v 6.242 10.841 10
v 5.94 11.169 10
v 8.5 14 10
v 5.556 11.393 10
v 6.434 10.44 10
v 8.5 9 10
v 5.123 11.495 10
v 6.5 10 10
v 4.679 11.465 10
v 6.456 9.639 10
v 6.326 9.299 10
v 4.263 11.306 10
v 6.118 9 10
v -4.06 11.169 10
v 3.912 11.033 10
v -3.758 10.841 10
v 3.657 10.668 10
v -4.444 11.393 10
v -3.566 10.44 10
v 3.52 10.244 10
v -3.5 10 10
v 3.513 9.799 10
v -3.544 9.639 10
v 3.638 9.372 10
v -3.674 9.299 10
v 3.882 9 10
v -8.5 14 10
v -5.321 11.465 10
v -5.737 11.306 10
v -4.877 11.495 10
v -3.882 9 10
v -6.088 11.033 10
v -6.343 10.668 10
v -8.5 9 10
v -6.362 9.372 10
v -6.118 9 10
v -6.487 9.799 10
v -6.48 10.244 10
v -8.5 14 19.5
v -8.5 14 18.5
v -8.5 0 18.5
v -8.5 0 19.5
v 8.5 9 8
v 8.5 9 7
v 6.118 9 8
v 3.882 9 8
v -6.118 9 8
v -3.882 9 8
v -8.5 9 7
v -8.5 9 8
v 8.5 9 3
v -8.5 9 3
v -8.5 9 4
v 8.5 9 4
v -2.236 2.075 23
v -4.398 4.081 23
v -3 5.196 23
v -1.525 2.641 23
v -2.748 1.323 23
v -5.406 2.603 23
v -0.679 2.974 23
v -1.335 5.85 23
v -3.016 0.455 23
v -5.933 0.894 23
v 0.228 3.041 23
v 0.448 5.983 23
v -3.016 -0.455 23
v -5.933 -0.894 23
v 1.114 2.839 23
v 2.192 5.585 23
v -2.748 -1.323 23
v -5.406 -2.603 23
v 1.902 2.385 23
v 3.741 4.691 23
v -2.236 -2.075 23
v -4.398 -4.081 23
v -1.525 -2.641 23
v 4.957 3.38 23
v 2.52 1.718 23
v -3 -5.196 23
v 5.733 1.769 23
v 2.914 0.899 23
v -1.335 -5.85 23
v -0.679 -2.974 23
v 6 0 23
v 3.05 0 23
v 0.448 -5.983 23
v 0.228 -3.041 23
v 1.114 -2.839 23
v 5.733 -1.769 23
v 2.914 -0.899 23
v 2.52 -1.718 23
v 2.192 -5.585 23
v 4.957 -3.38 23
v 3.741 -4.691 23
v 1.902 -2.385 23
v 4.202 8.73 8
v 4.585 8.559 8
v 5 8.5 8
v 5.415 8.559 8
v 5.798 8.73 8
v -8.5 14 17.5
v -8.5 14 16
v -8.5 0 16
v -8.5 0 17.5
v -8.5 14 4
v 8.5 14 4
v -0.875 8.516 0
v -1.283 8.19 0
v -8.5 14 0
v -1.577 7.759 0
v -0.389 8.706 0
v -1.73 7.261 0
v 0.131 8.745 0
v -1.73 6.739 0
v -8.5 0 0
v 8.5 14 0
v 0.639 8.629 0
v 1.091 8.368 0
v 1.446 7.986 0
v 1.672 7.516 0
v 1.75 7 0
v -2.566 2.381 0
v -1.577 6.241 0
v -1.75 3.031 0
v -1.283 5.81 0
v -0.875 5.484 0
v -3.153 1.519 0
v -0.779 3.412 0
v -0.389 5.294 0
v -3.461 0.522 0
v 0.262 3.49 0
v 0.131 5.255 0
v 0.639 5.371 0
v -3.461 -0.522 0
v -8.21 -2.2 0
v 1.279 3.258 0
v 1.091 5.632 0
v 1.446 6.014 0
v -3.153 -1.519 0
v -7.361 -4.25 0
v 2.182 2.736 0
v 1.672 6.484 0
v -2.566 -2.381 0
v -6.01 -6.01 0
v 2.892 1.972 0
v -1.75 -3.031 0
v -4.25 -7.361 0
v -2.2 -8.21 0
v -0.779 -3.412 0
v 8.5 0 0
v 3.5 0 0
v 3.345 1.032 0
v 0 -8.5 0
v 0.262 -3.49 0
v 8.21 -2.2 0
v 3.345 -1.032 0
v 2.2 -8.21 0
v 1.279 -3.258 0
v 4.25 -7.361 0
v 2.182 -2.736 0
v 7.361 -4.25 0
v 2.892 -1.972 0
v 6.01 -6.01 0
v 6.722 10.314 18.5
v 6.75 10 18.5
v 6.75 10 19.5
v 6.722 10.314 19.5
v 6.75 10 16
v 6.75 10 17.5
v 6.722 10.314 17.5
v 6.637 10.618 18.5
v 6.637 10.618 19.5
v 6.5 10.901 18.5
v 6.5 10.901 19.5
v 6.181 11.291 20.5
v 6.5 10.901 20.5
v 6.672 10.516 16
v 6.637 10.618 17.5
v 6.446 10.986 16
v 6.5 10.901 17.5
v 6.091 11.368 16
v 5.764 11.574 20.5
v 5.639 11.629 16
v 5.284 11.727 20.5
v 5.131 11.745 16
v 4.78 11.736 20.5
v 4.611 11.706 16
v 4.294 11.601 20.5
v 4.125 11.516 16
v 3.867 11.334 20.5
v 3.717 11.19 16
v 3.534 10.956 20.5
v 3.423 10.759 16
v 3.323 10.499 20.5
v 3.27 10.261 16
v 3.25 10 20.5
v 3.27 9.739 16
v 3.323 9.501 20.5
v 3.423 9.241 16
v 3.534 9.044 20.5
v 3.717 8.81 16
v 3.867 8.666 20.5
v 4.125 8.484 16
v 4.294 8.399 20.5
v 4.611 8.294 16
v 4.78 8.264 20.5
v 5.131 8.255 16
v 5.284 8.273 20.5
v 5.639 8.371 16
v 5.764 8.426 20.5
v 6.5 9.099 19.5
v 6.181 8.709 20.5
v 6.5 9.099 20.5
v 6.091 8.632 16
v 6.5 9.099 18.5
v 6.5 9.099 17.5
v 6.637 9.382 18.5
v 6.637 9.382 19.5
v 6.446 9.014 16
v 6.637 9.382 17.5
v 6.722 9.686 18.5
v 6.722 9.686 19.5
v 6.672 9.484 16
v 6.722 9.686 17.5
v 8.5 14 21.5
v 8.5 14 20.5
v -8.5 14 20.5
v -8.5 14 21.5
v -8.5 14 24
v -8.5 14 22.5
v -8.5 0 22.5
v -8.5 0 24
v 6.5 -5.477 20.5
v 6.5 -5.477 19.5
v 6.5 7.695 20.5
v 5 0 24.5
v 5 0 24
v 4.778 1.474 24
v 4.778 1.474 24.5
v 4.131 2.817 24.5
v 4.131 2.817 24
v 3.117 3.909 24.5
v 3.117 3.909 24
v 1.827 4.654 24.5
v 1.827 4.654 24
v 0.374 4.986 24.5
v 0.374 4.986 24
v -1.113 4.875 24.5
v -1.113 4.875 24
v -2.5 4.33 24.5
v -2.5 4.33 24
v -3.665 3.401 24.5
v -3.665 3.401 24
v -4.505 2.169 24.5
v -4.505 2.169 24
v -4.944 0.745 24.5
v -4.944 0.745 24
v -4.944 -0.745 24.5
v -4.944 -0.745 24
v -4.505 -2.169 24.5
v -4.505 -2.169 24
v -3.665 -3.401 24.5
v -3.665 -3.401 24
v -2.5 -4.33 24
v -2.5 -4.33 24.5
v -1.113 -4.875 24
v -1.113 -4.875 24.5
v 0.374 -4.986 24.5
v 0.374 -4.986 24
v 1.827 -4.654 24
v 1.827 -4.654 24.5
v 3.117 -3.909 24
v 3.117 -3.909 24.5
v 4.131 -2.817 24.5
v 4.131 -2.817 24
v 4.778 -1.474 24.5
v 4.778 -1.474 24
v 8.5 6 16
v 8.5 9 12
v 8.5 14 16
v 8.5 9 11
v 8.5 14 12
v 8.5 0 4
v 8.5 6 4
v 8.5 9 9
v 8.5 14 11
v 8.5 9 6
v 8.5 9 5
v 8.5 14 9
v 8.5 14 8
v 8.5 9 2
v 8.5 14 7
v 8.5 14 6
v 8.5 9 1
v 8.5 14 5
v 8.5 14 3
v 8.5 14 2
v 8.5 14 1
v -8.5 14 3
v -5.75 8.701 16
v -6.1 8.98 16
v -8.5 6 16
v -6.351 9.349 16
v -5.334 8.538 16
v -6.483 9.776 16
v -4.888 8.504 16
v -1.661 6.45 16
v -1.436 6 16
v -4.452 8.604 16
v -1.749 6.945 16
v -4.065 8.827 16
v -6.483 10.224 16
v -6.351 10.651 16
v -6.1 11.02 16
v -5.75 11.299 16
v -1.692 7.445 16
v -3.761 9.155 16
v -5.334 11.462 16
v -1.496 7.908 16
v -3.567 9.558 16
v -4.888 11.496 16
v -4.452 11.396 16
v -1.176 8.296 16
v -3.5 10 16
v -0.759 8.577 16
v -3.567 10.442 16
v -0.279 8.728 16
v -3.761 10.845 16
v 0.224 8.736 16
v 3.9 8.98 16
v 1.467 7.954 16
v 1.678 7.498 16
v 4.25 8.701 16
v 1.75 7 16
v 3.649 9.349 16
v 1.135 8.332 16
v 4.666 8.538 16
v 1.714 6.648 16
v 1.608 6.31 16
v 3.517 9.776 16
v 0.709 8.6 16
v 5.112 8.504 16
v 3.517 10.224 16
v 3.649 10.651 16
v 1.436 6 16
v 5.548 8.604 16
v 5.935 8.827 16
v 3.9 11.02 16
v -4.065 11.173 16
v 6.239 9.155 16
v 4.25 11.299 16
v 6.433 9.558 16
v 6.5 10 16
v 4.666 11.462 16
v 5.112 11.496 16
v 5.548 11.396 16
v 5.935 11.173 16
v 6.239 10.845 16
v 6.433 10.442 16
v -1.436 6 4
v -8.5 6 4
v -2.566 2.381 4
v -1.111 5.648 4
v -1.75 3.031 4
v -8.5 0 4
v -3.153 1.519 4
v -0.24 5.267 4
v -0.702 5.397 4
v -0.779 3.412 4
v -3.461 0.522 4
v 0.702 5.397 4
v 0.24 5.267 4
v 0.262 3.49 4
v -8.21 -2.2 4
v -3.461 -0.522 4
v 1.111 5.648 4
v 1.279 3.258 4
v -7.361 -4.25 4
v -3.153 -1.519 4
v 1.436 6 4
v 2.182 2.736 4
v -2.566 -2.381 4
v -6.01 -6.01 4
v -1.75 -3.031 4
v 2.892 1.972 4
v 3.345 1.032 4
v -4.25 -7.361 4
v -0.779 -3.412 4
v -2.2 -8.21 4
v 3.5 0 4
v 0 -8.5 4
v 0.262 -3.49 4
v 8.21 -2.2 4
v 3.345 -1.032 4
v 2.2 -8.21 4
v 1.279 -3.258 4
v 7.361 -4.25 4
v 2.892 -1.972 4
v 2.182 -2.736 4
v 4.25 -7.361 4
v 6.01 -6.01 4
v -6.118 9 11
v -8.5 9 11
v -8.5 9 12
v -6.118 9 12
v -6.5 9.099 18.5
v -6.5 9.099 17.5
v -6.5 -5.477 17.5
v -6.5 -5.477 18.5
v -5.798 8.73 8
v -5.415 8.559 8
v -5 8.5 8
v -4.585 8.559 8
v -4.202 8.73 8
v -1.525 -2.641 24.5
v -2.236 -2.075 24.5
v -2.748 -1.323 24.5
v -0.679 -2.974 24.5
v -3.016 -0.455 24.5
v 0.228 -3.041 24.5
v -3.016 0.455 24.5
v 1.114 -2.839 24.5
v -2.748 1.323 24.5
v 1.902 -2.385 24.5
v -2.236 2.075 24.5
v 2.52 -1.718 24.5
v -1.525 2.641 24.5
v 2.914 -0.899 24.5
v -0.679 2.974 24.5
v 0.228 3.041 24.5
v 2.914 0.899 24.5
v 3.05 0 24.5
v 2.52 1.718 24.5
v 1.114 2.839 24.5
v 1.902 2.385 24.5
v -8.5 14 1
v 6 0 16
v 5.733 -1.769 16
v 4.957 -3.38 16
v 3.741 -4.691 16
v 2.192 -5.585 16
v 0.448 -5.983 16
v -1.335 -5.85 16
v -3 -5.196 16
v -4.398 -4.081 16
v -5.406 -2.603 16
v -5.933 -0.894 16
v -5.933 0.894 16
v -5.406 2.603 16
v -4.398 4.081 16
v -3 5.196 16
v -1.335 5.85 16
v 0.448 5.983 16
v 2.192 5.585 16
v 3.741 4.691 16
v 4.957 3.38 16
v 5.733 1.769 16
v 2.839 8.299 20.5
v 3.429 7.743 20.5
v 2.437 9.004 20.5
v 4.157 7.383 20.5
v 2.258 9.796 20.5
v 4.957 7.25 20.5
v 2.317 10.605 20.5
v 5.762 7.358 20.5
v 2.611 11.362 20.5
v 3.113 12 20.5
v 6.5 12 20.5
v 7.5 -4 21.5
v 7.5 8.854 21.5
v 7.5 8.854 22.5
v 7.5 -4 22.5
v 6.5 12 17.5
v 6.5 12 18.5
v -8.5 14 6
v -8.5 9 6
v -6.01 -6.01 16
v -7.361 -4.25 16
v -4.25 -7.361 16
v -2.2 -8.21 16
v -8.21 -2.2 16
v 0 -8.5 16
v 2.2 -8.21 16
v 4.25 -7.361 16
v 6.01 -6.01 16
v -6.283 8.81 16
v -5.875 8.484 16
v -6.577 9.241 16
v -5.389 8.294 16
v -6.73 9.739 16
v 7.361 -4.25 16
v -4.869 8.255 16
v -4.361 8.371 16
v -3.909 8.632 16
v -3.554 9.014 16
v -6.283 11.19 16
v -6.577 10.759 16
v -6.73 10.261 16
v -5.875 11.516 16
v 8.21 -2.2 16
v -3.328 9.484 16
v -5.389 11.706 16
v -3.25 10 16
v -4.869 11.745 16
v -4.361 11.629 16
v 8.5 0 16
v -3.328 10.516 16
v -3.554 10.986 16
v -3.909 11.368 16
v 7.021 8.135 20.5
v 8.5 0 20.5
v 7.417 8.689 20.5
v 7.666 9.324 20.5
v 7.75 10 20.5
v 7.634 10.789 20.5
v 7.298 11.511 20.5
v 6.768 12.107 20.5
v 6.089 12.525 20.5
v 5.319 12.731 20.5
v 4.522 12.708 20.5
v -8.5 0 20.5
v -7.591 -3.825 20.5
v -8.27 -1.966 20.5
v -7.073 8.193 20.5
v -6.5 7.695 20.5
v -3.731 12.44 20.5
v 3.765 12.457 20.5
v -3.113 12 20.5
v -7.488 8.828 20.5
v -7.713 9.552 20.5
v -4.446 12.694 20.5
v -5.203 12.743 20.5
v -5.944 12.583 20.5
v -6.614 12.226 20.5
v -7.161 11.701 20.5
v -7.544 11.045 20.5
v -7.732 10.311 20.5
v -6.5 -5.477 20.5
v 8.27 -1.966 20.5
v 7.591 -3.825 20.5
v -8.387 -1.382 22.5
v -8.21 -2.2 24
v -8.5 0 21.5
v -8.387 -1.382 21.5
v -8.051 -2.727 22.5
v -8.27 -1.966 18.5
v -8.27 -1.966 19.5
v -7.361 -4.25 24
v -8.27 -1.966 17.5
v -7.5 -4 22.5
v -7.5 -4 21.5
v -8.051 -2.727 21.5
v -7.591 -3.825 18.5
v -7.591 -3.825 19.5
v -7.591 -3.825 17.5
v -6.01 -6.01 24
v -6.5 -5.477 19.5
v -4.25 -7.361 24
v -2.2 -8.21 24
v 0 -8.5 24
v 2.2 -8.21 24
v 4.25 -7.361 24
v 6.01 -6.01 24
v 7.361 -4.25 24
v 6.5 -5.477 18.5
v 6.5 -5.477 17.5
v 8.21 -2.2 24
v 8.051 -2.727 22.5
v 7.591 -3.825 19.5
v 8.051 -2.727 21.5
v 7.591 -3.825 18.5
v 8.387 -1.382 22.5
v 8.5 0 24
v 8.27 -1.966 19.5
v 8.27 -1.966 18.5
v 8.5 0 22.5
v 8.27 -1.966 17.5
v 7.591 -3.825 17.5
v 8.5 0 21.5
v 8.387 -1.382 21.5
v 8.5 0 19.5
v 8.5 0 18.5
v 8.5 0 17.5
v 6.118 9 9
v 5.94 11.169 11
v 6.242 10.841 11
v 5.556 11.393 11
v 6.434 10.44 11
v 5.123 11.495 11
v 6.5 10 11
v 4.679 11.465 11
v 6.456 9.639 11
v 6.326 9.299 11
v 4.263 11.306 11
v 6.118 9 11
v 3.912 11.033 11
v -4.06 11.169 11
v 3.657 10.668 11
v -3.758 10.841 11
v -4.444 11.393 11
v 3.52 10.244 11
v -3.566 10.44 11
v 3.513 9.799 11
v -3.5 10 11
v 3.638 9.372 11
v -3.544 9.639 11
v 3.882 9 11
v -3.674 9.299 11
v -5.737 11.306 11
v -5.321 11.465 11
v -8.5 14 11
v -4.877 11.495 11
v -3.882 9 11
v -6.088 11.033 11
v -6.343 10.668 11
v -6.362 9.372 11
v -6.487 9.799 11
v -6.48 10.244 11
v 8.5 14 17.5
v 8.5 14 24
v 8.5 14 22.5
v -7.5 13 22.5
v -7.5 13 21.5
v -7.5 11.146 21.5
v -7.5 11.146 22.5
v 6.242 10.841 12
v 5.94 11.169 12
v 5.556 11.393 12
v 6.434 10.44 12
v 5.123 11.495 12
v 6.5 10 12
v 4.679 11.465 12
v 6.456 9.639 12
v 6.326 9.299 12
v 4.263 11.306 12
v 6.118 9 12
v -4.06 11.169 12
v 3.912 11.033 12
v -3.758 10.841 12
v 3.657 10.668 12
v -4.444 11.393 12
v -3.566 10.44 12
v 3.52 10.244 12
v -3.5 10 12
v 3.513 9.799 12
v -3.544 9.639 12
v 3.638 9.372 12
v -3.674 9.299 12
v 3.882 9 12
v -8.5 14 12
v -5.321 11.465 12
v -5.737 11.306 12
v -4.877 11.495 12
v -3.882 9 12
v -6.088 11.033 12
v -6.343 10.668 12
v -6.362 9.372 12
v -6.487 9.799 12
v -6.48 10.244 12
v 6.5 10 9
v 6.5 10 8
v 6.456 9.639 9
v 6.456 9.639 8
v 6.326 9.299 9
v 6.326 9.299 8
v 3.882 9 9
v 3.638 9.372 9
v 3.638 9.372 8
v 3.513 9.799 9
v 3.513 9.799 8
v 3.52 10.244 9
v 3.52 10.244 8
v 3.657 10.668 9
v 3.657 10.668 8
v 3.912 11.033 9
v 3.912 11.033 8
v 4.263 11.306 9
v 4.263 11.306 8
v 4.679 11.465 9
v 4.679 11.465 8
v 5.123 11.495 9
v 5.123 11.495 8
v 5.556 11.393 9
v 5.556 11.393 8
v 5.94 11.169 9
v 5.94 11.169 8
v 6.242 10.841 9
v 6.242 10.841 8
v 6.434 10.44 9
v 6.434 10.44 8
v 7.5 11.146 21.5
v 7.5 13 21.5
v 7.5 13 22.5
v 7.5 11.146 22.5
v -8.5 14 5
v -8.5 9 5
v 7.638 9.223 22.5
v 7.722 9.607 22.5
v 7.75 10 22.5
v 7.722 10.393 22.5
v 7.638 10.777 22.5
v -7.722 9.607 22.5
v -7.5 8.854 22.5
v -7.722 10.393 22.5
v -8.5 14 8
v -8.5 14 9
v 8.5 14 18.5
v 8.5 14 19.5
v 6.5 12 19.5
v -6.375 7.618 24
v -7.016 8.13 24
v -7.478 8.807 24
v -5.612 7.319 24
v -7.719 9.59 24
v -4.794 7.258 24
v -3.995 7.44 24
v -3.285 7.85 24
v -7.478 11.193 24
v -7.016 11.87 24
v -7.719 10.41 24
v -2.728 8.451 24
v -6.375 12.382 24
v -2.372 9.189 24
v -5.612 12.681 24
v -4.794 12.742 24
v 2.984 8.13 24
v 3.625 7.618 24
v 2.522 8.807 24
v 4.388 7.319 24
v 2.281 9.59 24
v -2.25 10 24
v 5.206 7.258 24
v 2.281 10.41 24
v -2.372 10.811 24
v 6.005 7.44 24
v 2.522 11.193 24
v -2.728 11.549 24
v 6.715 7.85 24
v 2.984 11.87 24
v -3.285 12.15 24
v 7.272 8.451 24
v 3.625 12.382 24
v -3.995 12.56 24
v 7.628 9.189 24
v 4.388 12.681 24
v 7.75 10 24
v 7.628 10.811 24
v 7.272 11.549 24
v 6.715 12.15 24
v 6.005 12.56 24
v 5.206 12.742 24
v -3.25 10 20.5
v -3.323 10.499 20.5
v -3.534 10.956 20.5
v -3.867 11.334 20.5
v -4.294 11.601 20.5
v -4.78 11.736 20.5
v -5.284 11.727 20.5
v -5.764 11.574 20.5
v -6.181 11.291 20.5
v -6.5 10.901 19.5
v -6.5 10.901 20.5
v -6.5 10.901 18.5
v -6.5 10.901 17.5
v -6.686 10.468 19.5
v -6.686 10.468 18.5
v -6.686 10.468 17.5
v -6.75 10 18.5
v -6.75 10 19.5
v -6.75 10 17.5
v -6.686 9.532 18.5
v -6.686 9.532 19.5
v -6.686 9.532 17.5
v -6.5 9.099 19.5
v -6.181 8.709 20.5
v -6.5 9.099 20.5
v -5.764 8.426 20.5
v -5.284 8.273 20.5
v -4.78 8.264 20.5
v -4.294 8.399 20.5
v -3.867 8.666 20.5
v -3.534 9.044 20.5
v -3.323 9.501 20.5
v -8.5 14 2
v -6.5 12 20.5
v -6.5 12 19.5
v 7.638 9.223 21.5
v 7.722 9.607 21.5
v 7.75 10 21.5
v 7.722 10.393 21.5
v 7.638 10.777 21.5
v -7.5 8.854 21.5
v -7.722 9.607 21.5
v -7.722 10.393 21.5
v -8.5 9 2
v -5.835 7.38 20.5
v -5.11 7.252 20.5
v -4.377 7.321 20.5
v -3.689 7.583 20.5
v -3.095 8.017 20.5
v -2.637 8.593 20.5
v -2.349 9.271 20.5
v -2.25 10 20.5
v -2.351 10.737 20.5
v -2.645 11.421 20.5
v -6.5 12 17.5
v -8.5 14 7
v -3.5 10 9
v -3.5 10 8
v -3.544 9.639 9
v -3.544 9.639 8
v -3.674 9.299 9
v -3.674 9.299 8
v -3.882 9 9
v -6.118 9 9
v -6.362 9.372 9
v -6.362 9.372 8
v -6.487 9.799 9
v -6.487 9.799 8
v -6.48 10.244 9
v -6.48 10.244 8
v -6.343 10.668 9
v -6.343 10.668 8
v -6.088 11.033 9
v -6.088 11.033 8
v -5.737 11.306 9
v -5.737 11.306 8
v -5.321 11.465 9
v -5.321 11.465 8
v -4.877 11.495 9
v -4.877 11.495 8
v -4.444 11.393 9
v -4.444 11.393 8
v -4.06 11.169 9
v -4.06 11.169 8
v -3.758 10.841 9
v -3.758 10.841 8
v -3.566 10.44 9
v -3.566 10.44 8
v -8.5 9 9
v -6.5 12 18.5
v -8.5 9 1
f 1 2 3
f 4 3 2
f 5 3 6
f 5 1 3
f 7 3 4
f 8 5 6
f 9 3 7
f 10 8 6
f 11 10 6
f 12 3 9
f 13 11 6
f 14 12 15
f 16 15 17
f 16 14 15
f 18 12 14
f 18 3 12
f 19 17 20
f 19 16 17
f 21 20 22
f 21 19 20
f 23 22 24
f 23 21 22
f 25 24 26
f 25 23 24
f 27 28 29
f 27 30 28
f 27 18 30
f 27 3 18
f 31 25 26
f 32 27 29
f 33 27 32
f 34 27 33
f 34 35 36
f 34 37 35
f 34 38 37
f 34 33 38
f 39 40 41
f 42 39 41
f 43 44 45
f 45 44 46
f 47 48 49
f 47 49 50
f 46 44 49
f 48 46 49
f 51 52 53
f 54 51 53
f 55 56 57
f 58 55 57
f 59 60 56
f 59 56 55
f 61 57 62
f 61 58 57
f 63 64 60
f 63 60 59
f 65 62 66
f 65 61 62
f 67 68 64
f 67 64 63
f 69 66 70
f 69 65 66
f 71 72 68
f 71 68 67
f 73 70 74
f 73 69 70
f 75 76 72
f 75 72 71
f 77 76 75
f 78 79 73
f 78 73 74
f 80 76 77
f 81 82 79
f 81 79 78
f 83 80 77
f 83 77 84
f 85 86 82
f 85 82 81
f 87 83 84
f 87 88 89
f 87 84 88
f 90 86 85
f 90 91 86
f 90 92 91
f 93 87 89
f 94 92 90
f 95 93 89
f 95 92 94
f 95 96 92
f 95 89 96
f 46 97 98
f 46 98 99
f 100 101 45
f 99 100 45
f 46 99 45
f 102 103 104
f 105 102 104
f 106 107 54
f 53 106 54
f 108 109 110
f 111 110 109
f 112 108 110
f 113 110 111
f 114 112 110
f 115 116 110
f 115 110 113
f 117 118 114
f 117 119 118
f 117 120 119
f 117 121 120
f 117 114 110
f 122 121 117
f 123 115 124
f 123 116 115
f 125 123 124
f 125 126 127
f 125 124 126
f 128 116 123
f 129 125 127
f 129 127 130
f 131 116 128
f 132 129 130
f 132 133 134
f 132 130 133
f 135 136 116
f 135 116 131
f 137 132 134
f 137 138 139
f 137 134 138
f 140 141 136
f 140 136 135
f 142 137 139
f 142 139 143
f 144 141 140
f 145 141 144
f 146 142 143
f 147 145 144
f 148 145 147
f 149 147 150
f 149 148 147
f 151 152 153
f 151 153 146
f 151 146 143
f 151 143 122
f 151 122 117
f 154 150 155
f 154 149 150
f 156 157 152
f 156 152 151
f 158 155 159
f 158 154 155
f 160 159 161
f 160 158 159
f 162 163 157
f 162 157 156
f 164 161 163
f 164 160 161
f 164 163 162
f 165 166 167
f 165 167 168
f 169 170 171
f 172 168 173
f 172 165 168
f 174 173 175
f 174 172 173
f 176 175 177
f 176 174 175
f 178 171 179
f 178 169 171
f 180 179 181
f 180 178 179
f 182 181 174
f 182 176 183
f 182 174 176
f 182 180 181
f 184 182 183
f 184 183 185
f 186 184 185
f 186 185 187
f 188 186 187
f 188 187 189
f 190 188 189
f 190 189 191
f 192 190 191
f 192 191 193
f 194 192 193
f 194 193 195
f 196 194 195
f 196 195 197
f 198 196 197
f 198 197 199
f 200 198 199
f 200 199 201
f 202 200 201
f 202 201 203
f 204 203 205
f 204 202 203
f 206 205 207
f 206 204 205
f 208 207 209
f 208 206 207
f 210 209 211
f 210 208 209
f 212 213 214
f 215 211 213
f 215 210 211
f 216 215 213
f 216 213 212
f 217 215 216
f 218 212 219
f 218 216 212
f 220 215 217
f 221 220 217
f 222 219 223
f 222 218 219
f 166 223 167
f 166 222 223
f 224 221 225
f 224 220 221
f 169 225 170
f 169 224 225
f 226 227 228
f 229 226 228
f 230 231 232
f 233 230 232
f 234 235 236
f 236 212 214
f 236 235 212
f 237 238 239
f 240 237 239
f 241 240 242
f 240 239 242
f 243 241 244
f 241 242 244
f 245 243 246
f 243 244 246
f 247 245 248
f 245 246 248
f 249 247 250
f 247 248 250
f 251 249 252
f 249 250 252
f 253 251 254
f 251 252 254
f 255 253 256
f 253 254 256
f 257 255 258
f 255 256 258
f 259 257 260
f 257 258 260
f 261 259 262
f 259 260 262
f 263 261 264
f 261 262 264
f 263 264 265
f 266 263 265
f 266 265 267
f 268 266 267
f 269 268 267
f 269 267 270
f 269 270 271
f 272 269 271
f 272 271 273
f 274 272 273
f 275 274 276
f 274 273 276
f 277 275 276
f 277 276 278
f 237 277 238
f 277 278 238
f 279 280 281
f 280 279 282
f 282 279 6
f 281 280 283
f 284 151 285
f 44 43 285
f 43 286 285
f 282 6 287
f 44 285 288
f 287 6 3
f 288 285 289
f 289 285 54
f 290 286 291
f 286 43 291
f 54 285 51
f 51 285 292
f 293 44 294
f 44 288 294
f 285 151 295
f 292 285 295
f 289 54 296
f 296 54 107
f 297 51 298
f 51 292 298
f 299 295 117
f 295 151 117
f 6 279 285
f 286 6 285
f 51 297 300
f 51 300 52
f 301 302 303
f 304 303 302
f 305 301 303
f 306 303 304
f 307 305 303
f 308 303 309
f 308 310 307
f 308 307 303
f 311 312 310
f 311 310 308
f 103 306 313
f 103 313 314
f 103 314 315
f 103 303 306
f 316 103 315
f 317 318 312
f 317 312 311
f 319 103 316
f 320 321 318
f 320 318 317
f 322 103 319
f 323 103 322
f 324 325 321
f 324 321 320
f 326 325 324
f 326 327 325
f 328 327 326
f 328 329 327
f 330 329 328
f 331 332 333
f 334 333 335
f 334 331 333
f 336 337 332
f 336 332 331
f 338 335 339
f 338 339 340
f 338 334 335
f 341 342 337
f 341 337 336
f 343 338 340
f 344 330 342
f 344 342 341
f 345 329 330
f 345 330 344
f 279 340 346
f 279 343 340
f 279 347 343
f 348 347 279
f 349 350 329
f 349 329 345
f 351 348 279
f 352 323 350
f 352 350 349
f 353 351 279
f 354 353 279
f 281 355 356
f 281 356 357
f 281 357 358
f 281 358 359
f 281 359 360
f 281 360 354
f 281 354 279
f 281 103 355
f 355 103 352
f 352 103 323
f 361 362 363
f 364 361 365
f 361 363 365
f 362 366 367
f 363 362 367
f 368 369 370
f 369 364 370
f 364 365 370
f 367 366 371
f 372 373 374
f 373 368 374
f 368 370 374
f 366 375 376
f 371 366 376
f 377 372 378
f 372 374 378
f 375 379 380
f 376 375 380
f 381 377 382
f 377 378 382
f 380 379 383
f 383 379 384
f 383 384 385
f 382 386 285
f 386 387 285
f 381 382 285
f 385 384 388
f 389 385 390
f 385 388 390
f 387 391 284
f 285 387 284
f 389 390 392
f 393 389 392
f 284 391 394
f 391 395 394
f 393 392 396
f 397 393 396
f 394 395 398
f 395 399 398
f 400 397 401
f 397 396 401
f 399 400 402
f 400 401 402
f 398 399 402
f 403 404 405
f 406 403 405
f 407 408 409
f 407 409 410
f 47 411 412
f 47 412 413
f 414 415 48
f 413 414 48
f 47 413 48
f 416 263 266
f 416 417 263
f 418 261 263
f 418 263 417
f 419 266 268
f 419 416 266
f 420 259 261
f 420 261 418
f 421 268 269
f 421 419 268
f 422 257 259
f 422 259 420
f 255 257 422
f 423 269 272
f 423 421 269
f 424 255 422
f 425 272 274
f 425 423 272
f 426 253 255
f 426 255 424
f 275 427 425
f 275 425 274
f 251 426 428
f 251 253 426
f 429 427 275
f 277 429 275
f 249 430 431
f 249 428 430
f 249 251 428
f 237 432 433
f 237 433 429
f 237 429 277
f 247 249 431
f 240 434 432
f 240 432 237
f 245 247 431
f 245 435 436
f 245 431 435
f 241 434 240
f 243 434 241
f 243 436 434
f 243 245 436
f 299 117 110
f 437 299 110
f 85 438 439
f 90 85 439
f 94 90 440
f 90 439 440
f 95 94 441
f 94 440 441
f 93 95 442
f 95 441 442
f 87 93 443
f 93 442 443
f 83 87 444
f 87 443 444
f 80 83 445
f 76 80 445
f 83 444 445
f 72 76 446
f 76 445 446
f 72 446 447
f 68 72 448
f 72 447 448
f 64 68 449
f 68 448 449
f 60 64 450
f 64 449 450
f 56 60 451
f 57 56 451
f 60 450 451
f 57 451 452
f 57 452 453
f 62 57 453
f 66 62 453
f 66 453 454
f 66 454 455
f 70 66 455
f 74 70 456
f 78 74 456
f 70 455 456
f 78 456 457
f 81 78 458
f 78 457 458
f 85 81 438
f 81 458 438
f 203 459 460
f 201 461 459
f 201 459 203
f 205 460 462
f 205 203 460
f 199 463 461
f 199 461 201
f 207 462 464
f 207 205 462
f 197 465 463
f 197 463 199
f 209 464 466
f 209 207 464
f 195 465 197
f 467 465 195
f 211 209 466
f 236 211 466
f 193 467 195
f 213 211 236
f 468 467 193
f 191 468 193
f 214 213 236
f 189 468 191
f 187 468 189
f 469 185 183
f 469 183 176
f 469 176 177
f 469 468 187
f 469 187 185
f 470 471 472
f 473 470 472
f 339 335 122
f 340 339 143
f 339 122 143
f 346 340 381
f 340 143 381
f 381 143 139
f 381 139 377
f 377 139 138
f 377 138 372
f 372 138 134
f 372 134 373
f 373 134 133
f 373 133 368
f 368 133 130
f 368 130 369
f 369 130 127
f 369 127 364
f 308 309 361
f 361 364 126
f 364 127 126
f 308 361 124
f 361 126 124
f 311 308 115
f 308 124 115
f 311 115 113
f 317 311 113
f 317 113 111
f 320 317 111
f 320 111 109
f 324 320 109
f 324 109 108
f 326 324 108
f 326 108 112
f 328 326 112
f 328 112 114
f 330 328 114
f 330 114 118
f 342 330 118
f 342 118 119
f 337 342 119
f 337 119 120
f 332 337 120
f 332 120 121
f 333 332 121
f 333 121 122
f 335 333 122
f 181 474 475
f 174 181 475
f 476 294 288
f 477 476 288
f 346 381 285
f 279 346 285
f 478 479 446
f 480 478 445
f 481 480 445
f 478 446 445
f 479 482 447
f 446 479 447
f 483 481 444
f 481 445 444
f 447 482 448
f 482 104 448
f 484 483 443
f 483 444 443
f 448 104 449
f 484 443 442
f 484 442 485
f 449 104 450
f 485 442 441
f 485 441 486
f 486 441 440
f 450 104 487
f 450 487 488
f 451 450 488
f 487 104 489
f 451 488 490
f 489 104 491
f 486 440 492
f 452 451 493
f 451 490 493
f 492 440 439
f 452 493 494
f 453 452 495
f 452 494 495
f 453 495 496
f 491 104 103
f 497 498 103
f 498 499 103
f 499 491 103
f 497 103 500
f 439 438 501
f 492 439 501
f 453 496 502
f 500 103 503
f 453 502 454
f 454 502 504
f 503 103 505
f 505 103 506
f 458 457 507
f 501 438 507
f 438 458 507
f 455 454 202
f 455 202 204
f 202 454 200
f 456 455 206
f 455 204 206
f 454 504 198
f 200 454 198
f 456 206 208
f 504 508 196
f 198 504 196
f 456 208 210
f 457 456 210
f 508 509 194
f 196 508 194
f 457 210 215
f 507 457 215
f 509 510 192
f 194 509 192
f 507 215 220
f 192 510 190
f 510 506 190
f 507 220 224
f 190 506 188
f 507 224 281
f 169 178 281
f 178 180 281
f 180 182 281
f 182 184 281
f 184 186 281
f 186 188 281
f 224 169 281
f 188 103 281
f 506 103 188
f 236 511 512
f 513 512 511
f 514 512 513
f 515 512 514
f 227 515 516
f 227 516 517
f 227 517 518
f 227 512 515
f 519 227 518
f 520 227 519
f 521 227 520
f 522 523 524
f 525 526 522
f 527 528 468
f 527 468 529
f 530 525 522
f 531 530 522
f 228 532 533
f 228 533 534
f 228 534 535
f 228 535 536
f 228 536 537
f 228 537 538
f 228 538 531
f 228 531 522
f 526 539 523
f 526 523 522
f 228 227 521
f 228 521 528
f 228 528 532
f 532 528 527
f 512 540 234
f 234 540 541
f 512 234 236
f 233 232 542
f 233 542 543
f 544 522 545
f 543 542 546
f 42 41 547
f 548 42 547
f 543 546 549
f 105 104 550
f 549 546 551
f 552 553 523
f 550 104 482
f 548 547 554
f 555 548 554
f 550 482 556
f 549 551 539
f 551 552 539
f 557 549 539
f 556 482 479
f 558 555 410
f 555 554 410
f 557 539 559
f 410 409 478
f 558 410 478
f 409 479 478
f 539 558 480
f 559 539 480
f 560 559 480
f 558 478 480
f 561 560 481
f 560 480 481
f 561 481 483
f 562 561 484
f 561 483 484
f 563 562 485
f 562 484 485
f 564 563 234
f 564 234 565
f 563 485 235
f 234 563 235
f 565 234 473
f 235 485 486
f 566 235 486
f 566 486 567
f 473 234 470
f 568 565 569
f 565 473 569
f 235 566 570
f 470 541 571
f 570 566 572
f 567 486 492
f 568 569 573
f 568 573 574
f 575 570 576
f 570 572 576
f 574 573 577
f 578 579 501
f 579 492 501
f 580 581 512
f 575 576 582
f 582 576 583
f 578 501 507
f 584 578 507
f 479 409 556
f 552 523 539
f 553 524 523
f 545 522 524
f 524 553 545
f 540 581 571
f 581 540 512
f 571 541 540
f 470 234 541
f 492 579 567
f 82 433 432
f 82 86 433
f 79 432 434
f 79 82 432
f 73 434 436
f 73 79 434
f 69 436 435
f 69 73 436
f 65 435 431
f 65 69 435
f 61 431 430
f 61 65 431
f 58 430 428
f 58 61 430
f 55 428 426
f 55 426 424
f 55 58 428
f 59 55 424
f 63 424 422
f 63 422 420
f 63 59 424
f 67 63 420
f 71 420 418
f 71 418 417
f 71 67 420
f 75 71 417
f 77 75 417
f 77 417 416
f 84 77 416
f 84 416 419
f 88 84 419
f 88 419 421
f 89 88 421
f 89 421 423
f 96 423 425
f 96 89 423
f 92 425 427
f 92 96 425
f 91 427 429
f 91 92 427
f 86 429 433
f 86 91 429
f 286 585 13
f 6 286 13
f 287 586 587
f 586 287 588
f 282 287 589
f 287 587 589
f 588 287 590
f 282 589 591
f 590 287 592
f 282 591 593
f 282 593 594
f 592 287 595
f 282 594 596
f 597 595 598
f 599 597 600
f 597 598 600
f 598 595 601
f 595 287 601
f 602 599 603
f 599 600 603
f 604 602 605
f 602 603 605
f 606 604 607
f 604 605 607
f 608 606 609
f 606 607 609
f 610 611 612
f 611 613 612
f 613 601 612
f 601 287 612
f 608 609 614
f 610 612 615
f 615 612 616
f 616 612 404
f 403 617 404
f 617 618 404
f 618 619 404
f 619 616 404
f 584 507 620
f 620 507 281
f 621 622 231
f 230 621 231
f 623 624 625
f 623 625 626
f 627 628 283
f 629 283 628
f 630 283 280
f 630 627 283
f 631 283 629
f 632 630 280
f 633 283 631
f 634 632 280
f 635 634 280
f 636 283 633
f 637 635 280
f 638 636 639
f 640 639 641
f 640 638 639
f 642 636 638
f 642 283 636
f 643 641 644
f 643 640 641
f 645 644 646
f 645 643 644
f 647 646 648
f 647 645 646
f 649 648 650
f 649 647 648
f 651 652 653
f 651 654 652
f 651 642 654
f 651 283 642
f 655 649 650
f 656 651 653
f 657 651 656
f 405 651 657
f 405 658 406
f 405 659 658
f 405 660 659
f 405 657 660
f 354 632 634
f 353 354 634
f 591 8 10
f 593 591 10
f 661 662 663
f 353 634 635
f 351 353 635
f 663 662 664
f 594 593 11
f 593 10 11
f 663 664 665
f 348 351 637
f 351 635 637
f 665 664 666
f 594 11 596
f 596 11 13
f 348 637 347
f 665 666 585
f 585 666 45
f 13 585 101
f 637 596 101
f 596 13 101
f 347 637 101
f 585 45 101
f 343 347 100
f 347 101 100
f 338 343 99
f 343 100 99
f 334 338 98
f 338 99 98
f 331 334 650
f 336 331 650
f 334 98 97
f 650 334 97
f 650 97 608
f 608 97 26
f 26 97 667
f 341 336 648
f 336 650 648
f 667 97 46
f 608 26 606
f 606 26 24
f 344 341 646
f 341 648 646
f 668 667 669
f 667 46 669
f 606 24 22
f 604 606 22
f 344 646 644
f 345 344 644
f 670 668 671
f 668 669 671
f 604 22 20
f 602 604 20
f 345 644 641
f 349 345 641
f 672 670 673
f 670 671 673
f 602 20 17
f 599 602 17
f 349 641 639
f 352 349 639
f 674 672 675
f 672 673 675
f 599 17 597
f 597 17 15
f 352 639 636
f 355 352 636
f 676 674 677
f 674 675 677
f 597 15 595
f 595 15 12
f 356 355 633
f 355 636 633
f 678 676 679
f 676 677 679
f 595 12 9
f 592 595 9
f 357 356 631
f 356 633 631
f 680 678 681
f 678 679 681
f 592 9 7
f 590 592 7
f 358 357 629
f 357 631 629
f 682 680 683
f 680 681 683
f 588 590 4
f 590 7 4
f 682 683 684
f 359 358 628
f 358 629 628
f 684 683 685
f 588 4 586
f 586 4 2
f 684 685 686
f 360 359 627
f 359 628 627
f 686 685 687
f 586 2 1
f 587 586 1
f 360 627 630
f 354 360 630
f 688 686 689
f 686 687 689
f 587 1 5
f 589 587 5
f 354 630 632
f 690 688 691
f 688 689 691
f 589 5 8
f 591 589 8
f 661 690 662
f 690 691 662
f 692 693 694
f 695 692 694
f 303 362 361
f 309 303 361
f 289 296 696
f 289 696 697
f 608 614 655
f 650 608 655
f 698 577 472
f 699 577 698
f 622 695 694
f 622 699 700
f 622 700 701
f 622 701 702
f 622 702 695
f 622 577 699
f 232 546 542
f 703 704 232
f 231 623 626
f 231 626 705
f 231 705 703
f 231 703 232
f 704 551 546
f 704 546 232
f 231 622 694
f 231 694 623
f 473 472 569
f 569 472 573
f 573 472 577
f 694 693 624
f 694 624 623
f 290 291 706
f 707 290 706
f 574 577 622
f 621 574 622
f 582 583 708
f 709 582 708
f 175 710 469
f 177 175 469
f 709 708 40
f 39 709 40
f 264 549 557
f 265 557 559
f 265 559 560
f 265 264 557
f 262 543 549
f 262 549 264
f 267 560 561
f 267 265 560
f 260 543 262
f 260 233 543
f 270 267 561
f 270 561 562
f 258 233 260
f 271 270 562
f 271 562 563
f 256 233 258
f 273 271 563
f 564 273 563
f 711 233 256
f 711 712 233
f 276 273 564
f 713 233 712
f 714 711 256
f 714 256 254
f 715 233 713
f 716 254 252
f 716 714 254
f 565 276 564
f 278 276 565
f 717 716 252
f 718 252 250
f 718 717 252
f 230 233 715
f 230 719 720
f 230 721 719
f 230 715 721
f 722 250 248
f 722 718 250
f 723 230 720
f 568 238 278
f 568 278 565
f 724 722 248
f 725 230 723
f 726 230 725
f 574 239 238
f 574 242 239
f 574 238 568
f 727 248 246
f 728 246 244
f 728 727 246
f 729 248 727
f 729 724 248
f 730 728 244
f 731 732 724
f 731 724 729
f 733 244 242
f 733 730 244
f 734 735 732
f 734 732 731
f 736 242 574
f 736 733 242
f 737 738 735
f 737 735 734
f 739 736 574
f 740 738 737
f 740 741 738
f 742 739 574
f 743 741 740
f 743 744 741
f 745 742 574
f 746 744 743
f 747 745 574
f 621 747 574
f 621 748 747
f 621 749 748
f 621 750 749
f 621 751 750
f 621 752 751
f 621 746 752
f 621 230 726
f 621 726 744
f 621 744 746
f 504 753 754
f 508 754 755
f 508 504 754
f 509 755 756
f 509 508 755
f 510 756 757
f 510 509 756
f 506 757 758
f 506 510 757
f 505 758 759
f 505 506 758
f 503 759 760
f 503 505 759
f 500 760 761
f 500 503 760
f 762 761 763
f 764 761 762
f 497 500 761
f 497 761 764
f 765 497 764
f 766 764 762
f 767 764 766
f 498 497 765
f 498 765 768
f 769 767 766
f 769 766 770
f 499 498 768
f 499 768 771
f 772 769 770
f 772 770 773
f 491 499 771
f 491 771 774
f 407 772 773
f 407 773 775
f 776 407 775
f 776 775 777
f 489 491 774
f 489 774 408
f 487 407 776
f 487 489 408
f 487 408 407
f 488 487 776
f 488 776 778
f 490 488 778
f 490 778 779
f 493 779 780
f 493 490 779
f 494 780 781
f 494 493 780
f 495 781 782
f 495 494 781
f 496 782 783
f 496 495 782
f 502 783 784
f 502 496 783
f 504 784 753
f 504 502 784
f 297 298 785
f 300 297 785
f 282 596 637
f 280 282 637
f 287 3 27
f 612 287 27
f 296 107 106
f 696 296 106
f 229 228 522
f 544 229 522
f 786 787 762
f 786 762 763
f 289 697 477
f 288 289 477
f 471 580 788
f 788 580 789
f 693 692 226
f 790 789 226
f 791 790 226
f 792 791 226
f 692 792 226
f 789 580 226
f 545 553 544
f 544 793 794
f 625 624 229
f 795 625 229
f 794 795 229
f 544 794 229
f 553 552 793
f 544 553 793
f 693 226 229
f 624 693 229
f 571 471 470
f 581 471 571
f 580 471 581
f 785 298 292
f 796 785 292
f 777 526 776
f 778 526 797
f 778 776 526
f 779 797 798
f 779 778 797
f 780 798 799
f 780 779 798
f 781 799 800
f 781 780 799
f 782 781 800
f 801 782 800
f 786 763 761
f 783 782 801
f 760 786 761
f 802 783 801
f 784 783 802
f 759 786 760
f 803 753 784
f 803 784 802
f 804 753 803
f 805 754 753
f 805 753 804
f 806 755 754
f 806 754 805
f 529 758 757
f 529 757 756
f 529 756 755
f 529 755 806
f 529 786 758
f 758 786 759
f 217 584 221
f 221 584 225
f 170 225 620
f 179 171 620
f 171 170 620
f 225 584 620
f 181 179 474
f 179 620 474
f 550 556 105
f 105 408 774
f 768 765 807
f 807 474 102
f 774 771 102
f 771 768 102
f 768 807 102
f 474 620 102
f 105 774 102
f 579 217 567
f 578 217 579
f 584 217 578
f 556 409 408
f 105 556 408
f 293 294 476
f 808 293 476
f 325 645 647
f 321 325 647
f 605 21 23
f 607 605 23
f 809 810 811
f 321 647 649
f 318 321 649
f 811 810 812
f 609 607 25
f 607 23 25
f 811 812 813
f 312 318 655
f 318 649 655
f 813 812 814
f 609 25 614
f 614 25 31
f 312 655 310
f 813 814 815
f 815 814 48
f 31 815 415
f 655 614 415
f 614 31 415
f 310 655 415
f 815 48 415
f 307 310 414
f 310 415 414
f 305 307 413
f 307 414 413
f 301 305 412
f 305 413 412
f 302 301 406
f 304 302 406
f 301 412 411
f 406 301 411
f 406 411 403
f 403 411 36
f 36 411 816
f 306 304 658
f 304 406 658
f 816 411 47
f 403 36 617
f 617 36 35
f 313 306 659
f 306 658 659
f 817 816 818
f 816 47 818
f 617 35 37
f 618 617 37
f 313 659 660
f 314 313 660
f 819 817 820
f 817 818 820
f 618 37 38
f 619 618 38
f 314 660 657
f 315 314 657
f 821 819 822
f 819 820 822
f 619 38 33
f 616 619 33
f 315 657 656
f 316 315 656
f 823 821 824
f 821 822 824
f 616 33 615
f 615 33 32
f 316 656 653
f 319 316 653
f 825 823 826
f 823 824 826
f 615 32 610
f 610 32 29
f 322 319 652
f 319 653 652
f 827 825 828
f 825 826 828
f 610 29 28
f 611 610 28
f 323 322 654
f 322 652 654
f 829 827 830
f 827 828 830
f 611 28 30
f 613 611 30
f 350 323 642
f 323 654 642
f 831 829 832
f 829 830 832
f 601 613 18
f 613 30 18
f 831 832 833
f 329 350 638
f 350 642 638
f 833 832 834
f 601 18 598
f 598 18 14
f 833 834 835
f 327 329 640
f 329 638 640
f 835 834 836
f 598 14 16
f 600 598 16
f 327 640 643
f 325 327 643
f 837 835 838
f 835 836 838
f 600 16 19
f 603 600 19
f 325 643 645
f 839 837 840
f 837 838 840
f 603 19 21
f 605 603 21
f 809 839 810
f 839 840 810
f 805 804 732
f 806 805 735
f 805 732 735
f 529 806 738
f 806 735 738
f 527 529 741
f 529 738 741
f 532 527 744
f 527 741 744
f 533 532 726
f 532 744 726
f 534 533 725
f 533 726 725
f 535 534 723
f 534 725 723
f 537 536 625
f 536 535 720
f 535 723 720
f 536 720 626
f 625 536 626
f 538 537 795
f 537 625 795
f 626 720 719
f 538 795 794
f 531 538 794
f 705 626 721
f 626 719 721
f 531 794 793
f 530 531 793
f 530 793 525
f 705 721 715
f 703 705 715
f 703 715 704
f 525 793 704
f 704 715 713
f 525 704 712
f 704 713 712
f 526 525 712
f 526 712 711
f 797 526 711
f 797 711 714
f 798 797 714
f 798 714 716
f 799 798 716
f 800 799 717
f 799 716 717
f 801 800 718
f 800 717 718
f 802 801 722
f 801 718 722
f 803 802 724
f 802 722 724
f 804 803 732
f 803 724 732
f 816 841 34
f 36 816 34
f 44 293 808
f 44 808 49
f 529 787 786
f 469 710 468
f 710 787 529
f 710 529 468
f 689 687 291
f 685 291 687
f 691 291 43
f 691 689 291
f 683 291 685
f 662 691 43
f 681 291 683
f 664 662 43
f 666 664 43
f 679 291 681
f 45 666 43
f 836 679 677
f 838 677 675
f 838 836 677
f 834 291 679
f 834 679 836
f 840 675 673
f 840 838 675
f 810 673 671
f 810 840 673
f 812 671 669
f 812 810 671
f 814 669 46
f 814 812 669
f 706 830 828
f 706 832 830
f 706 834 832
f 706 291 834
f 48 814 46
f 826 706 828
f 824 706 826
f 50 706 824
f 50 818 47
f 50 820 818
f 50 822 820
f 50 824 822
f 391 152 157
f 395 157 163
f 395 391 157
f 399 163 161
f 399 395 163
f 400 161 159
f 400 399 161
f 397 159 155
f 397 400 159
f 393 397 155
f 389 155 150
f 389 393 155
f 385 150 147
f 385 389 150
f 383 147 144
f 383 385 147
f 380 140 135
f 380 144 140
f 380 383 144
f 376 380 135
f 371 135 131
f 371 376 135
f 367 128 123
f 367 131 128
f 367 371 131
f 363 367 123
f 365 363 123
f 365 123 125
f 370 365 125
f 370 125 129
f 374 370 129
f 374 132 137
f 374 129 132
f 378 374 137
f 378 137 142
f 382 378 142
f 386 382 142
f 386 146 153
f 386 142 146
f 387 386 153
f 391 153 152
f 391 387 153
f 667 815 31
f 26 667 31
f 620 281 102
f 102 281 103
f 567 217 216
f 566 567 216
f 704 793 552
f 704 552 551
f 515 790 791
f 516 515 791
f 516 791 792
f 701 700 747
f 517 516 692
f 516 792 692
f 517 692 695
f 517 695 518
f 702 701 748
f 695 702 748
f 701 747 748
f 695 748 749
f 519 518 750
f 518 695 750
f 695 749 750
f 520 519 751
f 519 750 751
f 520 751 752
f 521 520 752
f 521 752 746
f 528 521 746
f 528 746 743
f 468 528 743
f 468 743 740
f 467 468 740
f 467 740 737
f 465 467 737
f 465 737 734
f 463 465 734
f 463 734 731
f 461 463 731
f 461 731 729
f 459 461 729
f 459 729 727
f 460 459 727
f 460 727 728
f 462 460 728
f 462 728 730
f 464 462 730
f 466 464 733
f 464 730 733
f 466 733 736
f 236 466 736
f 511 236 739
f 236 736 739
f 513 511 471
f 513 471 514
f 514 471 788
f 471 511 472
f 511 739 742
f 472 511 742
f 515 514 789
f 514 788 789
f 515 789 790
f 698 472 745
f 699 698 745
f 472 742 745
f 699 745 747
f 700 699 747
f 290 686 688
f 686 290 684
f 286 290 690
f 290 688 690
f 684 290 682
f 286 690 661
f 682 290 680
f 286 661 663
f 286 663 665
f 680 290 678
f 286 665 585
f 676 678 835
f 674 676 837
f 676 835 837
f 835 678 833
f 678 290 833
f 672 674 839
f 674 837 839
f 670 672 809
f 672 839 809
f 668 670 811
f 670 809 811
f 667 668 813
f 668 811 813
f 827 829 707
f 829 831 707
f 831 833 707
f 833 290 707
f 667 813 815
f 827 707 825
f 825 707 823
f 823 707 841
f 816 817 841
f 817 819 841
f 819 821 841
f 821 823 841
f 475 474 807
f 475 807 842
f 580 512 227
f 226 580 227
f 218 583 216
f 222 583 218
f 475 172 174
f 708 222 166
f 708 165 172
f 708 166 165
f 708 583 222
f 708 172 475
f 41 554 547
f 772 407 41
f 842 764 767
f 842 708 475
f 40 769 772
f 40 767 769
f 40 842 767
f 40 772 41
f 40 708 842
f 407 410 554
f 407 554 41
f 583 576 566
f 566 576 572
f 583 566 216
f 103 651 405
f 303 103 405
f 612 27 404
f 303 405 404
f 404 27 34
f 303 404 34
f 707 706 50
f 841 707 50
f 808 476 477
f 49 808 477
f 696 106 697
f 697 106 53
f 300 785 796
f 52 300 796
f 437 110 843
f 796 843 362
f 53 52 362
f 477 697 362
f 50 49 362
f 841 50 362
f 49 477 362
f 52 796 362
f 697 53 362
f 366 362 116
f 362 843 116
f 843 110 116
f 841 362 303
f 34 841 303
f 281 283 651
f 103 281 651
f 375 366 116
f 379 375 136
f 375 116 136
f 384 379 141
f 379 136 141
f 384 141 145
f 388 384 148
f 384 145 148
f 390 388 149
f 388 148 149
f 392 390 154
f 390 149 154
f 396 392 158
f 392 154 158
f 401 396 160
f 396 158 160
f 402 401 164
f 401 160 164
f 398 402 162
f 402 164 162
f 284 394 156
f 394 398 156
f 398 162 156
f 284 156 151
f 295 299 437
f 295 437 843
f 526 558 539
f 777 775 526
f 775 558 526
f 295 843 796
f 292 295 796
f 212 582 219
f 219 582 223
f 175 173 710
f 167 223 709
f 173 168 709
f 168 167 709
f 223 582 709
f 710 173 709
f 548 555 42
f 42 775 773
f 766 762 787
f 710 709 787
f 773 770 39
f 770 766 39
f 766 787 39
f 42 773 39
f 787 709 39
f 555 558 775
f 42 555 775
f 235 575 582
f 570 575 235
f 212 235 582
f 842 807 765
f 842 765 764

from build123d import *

# Parameters (mm, degrees)
F1_DEPTH  = 16
F2_R      = 1.75
F2_R_2    = 1.5
F3_DEPTH  = 16.001
F5_R      = 3.5
F6_DEPTH  = 4.001
F8_DEPTH  = 13
F9_R      = 3.05
F9_R_2    = 1.75
F10_DEPTH = 8
F11_R     = 2.75
F12_DEPTH = 3.5
F13_R     = 6
F14_DEPTH = 7
F15_R     = 1.5
F16_DEPTH = 8
F17_W     = 5
F17_H     = 1
F18_DEPTH = 17.001
F19_W     = 2
F19_H     = 1
F19_W_2   = 1
F20_DEPTH = 22.501
F21_W     = 2
F21_H     = 1
F21_W_2   = 1
F22_DEPTH = 17.001
F23_R     = 5
F23_R_2   = 3.05
F24_DEPTH = 0.5


with BuildPart() as f1:
    # F0 (on Top) → F1 (new body)
    with BuildSketch(Plane.XY):
        with BuildLine():
            Line((-8.5, 14), (-8.5, 0))
            ThreePointArc((-8.5, 0), (0, -8.5), (8.5, 0))
            Line((8.5, 0), (8.5, 14))
            Line((8.5, 14), (-8.5, 14))
        make_face()
    extrude(amount=F1_DEPTH)

    # F2 (on face) → F3 (cut, through all)
    with BuildSketch(Plane(origin=(0, 0, 0), x_dir=(1, 0, 0), z_dir=(0, 0, -1))):
        with Locations((0, -7)):
            Circle(F2_R)
        with Locations((5, -10)):
            Circle(F2_R_2)
        with Locations((-5, -10)):
            Circle(F2_R_2)
    extrude(amount=-F3_DEPTH, mode=Mode.SUBTRACT)

    # F5 (on offset) → F6 (cut, through all)
    with BuildSketch(Plane(origin=(0, 0, 4), x_dir=(1, 0, 0), z_dir=(0, 0, -1))):
        Circle(F5_R)
    extrude(amount=F6_DEPTH, mode=Mode.SUBTRACT)

    # F7 (on offset) → F8 (cut)
    with BuildSketch(Plane(origin=(0, 0, 4), x_dir=(1, 0, 0), z_dir=(0, 0, -1))):
        with BuildLine():
            Line((8.5, -6), (8.5, 0))
            ThreePointArc((8.5, 0), (0, 8.5), (-8.5, 0))
            Line((-8.5, 0), (-8.5, -6))
            Line((-8.5, -6), (8.5, -6))
        make_face()
    extrude(amount=-F8_DEPTH, mode=Mode.SUBTRACT)

    # F15 (on face) → F16 (join)
    with BuildSketch(Plane(origin=(0, 0, 0), x_dir=(1, 0, 0), z_dir=(0, 0, -1))):
        with Locations((5, -10)):
            Circle(F15_R)
        with Locations((-5, -10)):
            Circle(F15_R)
    extrude(amount=-F16_DEPTH)

    # F17 (on face) → F18 (cut, through all)
    with BuildSketch(Plane(origin=(-8.5, 0, 0), x_dir=(0, -1, 0), z_dir=(-1, 0, 0))):
        with Locations((-11.5, 1.5)):
            Rectangle(F17_W, F17_H)
        with Locations((-11.5, 3.5)):
            Rectangle(F17_W, F17_H)
        with Locations((-11.5, 5.5)):
            Rectangle(F17_W, F17_H)
        with Locations((-11.5, 7.5)):
            Rectangle(F17_W, F17_H)
        with Locations((-11.5, 9.5)):
            Rectangle(F17_W, F17_H)
        with Locations((-11.5, 11.5)):
            Rectangle(F17_W, F17_H)
    extrude(amount=-F18_DEPTH, mode=Mode.SUBTRACT)


with BuildPart() as f10:
    # F9 (on face) → F10 (new body)
    with BuildSketch(Plane.XY.offset(16)):
        with BuildLine():
            Line((-8.5, 14), (-8.5, 0))
            ThreePointArc((-8.5, 0), (0, -8.5), (8.5, 0))
            Line((8.5, 0), (8.5, 14))
            Line((8.5, 14), (-8.5, 14))
        make_face()
        Circle(F9_R, mode=Mode.SUBTRACT)
        with Locations((-5, 10)):
            Circle(F9_R_2, mode=Mode.SUBTRACT)
        with Locations((5, 10)):
            Circle(F9_R_2, mode=Mode.SUBTRACT)
    extrude(amount=F10_DEPTH)

    # F11 (on face) → F12 (cut)
    with BuildSketch(Plane.XY.offset(24)):
        with Locations((-5, 10)):
            Circle(F11_R)
        with Locations((5, 10)):
            Circle(F11_R)
    extrude(amount=-F12_DEPTH, mode=Mode.SUBTRACT)

    # F13 (on face) → F14 (cut)
    with BuildSketch(Plane(origin=(0, 0, 16), x_dir=(1, 0, 0), z_dir=(0, 0, -1))):
        Circle(F13_R)
    extrude(amount=-F14_DEPTH, mode=Mode.SUBTRACT)

    # F19 (on face) → F20 (cut, through all)
    with BuildSketch(Plane(origin=(0, 14, 0), x_dir=(-1, 0, 0), z_dir=(0, 1, 0))):
        with Locations((-7.5, 20)):
            Rectangle(F19_W, F19_H)
        with Locations((-7.5, 18)):
            Rectangle(F19_W, F19_H)
        with Locations((-8, 22)):
            Rectangle(F19_W_2, F19_H)
        with Locations((7.5, 18)):
            Rectangle(F19_W, F19_H)
        with Locations((7.5, 20)):
            Rectangle(F19_W, F19_H)
        with Locations((8, 22)):
            Rectangle(F19_W_2, F19_H)
    extrude(amount=-F20_DEPTH, mode=Mode.SUBTRACT)

    # F21 (on face) → F22 (cut, through all)
    with BuildSketch(Plane.YZ.offset(8.5)):
        with Locations((13, 18)):
            Rectangle(F21_W, F21_H)
        with Locations((13, 20)):
            Rectangle(F21_W, F21_H)
        with Locations((13.5, 22)):
            Rectangle(F21_W_2, F21_H)
    extrude(amount=-F22_DEPTH, mode=Mode.SUBTRACT)

    # F23 (on face) → F24 (join)
    with BuildSketch(Plane.XY.offset(24)):
        Circle(F23_R)
        Circle(F23_R_2, mode=Mode.SUBTRACT)
    extrude(amount=F24_DEPTH)


solid = Compound([f1.part, f10.part])
